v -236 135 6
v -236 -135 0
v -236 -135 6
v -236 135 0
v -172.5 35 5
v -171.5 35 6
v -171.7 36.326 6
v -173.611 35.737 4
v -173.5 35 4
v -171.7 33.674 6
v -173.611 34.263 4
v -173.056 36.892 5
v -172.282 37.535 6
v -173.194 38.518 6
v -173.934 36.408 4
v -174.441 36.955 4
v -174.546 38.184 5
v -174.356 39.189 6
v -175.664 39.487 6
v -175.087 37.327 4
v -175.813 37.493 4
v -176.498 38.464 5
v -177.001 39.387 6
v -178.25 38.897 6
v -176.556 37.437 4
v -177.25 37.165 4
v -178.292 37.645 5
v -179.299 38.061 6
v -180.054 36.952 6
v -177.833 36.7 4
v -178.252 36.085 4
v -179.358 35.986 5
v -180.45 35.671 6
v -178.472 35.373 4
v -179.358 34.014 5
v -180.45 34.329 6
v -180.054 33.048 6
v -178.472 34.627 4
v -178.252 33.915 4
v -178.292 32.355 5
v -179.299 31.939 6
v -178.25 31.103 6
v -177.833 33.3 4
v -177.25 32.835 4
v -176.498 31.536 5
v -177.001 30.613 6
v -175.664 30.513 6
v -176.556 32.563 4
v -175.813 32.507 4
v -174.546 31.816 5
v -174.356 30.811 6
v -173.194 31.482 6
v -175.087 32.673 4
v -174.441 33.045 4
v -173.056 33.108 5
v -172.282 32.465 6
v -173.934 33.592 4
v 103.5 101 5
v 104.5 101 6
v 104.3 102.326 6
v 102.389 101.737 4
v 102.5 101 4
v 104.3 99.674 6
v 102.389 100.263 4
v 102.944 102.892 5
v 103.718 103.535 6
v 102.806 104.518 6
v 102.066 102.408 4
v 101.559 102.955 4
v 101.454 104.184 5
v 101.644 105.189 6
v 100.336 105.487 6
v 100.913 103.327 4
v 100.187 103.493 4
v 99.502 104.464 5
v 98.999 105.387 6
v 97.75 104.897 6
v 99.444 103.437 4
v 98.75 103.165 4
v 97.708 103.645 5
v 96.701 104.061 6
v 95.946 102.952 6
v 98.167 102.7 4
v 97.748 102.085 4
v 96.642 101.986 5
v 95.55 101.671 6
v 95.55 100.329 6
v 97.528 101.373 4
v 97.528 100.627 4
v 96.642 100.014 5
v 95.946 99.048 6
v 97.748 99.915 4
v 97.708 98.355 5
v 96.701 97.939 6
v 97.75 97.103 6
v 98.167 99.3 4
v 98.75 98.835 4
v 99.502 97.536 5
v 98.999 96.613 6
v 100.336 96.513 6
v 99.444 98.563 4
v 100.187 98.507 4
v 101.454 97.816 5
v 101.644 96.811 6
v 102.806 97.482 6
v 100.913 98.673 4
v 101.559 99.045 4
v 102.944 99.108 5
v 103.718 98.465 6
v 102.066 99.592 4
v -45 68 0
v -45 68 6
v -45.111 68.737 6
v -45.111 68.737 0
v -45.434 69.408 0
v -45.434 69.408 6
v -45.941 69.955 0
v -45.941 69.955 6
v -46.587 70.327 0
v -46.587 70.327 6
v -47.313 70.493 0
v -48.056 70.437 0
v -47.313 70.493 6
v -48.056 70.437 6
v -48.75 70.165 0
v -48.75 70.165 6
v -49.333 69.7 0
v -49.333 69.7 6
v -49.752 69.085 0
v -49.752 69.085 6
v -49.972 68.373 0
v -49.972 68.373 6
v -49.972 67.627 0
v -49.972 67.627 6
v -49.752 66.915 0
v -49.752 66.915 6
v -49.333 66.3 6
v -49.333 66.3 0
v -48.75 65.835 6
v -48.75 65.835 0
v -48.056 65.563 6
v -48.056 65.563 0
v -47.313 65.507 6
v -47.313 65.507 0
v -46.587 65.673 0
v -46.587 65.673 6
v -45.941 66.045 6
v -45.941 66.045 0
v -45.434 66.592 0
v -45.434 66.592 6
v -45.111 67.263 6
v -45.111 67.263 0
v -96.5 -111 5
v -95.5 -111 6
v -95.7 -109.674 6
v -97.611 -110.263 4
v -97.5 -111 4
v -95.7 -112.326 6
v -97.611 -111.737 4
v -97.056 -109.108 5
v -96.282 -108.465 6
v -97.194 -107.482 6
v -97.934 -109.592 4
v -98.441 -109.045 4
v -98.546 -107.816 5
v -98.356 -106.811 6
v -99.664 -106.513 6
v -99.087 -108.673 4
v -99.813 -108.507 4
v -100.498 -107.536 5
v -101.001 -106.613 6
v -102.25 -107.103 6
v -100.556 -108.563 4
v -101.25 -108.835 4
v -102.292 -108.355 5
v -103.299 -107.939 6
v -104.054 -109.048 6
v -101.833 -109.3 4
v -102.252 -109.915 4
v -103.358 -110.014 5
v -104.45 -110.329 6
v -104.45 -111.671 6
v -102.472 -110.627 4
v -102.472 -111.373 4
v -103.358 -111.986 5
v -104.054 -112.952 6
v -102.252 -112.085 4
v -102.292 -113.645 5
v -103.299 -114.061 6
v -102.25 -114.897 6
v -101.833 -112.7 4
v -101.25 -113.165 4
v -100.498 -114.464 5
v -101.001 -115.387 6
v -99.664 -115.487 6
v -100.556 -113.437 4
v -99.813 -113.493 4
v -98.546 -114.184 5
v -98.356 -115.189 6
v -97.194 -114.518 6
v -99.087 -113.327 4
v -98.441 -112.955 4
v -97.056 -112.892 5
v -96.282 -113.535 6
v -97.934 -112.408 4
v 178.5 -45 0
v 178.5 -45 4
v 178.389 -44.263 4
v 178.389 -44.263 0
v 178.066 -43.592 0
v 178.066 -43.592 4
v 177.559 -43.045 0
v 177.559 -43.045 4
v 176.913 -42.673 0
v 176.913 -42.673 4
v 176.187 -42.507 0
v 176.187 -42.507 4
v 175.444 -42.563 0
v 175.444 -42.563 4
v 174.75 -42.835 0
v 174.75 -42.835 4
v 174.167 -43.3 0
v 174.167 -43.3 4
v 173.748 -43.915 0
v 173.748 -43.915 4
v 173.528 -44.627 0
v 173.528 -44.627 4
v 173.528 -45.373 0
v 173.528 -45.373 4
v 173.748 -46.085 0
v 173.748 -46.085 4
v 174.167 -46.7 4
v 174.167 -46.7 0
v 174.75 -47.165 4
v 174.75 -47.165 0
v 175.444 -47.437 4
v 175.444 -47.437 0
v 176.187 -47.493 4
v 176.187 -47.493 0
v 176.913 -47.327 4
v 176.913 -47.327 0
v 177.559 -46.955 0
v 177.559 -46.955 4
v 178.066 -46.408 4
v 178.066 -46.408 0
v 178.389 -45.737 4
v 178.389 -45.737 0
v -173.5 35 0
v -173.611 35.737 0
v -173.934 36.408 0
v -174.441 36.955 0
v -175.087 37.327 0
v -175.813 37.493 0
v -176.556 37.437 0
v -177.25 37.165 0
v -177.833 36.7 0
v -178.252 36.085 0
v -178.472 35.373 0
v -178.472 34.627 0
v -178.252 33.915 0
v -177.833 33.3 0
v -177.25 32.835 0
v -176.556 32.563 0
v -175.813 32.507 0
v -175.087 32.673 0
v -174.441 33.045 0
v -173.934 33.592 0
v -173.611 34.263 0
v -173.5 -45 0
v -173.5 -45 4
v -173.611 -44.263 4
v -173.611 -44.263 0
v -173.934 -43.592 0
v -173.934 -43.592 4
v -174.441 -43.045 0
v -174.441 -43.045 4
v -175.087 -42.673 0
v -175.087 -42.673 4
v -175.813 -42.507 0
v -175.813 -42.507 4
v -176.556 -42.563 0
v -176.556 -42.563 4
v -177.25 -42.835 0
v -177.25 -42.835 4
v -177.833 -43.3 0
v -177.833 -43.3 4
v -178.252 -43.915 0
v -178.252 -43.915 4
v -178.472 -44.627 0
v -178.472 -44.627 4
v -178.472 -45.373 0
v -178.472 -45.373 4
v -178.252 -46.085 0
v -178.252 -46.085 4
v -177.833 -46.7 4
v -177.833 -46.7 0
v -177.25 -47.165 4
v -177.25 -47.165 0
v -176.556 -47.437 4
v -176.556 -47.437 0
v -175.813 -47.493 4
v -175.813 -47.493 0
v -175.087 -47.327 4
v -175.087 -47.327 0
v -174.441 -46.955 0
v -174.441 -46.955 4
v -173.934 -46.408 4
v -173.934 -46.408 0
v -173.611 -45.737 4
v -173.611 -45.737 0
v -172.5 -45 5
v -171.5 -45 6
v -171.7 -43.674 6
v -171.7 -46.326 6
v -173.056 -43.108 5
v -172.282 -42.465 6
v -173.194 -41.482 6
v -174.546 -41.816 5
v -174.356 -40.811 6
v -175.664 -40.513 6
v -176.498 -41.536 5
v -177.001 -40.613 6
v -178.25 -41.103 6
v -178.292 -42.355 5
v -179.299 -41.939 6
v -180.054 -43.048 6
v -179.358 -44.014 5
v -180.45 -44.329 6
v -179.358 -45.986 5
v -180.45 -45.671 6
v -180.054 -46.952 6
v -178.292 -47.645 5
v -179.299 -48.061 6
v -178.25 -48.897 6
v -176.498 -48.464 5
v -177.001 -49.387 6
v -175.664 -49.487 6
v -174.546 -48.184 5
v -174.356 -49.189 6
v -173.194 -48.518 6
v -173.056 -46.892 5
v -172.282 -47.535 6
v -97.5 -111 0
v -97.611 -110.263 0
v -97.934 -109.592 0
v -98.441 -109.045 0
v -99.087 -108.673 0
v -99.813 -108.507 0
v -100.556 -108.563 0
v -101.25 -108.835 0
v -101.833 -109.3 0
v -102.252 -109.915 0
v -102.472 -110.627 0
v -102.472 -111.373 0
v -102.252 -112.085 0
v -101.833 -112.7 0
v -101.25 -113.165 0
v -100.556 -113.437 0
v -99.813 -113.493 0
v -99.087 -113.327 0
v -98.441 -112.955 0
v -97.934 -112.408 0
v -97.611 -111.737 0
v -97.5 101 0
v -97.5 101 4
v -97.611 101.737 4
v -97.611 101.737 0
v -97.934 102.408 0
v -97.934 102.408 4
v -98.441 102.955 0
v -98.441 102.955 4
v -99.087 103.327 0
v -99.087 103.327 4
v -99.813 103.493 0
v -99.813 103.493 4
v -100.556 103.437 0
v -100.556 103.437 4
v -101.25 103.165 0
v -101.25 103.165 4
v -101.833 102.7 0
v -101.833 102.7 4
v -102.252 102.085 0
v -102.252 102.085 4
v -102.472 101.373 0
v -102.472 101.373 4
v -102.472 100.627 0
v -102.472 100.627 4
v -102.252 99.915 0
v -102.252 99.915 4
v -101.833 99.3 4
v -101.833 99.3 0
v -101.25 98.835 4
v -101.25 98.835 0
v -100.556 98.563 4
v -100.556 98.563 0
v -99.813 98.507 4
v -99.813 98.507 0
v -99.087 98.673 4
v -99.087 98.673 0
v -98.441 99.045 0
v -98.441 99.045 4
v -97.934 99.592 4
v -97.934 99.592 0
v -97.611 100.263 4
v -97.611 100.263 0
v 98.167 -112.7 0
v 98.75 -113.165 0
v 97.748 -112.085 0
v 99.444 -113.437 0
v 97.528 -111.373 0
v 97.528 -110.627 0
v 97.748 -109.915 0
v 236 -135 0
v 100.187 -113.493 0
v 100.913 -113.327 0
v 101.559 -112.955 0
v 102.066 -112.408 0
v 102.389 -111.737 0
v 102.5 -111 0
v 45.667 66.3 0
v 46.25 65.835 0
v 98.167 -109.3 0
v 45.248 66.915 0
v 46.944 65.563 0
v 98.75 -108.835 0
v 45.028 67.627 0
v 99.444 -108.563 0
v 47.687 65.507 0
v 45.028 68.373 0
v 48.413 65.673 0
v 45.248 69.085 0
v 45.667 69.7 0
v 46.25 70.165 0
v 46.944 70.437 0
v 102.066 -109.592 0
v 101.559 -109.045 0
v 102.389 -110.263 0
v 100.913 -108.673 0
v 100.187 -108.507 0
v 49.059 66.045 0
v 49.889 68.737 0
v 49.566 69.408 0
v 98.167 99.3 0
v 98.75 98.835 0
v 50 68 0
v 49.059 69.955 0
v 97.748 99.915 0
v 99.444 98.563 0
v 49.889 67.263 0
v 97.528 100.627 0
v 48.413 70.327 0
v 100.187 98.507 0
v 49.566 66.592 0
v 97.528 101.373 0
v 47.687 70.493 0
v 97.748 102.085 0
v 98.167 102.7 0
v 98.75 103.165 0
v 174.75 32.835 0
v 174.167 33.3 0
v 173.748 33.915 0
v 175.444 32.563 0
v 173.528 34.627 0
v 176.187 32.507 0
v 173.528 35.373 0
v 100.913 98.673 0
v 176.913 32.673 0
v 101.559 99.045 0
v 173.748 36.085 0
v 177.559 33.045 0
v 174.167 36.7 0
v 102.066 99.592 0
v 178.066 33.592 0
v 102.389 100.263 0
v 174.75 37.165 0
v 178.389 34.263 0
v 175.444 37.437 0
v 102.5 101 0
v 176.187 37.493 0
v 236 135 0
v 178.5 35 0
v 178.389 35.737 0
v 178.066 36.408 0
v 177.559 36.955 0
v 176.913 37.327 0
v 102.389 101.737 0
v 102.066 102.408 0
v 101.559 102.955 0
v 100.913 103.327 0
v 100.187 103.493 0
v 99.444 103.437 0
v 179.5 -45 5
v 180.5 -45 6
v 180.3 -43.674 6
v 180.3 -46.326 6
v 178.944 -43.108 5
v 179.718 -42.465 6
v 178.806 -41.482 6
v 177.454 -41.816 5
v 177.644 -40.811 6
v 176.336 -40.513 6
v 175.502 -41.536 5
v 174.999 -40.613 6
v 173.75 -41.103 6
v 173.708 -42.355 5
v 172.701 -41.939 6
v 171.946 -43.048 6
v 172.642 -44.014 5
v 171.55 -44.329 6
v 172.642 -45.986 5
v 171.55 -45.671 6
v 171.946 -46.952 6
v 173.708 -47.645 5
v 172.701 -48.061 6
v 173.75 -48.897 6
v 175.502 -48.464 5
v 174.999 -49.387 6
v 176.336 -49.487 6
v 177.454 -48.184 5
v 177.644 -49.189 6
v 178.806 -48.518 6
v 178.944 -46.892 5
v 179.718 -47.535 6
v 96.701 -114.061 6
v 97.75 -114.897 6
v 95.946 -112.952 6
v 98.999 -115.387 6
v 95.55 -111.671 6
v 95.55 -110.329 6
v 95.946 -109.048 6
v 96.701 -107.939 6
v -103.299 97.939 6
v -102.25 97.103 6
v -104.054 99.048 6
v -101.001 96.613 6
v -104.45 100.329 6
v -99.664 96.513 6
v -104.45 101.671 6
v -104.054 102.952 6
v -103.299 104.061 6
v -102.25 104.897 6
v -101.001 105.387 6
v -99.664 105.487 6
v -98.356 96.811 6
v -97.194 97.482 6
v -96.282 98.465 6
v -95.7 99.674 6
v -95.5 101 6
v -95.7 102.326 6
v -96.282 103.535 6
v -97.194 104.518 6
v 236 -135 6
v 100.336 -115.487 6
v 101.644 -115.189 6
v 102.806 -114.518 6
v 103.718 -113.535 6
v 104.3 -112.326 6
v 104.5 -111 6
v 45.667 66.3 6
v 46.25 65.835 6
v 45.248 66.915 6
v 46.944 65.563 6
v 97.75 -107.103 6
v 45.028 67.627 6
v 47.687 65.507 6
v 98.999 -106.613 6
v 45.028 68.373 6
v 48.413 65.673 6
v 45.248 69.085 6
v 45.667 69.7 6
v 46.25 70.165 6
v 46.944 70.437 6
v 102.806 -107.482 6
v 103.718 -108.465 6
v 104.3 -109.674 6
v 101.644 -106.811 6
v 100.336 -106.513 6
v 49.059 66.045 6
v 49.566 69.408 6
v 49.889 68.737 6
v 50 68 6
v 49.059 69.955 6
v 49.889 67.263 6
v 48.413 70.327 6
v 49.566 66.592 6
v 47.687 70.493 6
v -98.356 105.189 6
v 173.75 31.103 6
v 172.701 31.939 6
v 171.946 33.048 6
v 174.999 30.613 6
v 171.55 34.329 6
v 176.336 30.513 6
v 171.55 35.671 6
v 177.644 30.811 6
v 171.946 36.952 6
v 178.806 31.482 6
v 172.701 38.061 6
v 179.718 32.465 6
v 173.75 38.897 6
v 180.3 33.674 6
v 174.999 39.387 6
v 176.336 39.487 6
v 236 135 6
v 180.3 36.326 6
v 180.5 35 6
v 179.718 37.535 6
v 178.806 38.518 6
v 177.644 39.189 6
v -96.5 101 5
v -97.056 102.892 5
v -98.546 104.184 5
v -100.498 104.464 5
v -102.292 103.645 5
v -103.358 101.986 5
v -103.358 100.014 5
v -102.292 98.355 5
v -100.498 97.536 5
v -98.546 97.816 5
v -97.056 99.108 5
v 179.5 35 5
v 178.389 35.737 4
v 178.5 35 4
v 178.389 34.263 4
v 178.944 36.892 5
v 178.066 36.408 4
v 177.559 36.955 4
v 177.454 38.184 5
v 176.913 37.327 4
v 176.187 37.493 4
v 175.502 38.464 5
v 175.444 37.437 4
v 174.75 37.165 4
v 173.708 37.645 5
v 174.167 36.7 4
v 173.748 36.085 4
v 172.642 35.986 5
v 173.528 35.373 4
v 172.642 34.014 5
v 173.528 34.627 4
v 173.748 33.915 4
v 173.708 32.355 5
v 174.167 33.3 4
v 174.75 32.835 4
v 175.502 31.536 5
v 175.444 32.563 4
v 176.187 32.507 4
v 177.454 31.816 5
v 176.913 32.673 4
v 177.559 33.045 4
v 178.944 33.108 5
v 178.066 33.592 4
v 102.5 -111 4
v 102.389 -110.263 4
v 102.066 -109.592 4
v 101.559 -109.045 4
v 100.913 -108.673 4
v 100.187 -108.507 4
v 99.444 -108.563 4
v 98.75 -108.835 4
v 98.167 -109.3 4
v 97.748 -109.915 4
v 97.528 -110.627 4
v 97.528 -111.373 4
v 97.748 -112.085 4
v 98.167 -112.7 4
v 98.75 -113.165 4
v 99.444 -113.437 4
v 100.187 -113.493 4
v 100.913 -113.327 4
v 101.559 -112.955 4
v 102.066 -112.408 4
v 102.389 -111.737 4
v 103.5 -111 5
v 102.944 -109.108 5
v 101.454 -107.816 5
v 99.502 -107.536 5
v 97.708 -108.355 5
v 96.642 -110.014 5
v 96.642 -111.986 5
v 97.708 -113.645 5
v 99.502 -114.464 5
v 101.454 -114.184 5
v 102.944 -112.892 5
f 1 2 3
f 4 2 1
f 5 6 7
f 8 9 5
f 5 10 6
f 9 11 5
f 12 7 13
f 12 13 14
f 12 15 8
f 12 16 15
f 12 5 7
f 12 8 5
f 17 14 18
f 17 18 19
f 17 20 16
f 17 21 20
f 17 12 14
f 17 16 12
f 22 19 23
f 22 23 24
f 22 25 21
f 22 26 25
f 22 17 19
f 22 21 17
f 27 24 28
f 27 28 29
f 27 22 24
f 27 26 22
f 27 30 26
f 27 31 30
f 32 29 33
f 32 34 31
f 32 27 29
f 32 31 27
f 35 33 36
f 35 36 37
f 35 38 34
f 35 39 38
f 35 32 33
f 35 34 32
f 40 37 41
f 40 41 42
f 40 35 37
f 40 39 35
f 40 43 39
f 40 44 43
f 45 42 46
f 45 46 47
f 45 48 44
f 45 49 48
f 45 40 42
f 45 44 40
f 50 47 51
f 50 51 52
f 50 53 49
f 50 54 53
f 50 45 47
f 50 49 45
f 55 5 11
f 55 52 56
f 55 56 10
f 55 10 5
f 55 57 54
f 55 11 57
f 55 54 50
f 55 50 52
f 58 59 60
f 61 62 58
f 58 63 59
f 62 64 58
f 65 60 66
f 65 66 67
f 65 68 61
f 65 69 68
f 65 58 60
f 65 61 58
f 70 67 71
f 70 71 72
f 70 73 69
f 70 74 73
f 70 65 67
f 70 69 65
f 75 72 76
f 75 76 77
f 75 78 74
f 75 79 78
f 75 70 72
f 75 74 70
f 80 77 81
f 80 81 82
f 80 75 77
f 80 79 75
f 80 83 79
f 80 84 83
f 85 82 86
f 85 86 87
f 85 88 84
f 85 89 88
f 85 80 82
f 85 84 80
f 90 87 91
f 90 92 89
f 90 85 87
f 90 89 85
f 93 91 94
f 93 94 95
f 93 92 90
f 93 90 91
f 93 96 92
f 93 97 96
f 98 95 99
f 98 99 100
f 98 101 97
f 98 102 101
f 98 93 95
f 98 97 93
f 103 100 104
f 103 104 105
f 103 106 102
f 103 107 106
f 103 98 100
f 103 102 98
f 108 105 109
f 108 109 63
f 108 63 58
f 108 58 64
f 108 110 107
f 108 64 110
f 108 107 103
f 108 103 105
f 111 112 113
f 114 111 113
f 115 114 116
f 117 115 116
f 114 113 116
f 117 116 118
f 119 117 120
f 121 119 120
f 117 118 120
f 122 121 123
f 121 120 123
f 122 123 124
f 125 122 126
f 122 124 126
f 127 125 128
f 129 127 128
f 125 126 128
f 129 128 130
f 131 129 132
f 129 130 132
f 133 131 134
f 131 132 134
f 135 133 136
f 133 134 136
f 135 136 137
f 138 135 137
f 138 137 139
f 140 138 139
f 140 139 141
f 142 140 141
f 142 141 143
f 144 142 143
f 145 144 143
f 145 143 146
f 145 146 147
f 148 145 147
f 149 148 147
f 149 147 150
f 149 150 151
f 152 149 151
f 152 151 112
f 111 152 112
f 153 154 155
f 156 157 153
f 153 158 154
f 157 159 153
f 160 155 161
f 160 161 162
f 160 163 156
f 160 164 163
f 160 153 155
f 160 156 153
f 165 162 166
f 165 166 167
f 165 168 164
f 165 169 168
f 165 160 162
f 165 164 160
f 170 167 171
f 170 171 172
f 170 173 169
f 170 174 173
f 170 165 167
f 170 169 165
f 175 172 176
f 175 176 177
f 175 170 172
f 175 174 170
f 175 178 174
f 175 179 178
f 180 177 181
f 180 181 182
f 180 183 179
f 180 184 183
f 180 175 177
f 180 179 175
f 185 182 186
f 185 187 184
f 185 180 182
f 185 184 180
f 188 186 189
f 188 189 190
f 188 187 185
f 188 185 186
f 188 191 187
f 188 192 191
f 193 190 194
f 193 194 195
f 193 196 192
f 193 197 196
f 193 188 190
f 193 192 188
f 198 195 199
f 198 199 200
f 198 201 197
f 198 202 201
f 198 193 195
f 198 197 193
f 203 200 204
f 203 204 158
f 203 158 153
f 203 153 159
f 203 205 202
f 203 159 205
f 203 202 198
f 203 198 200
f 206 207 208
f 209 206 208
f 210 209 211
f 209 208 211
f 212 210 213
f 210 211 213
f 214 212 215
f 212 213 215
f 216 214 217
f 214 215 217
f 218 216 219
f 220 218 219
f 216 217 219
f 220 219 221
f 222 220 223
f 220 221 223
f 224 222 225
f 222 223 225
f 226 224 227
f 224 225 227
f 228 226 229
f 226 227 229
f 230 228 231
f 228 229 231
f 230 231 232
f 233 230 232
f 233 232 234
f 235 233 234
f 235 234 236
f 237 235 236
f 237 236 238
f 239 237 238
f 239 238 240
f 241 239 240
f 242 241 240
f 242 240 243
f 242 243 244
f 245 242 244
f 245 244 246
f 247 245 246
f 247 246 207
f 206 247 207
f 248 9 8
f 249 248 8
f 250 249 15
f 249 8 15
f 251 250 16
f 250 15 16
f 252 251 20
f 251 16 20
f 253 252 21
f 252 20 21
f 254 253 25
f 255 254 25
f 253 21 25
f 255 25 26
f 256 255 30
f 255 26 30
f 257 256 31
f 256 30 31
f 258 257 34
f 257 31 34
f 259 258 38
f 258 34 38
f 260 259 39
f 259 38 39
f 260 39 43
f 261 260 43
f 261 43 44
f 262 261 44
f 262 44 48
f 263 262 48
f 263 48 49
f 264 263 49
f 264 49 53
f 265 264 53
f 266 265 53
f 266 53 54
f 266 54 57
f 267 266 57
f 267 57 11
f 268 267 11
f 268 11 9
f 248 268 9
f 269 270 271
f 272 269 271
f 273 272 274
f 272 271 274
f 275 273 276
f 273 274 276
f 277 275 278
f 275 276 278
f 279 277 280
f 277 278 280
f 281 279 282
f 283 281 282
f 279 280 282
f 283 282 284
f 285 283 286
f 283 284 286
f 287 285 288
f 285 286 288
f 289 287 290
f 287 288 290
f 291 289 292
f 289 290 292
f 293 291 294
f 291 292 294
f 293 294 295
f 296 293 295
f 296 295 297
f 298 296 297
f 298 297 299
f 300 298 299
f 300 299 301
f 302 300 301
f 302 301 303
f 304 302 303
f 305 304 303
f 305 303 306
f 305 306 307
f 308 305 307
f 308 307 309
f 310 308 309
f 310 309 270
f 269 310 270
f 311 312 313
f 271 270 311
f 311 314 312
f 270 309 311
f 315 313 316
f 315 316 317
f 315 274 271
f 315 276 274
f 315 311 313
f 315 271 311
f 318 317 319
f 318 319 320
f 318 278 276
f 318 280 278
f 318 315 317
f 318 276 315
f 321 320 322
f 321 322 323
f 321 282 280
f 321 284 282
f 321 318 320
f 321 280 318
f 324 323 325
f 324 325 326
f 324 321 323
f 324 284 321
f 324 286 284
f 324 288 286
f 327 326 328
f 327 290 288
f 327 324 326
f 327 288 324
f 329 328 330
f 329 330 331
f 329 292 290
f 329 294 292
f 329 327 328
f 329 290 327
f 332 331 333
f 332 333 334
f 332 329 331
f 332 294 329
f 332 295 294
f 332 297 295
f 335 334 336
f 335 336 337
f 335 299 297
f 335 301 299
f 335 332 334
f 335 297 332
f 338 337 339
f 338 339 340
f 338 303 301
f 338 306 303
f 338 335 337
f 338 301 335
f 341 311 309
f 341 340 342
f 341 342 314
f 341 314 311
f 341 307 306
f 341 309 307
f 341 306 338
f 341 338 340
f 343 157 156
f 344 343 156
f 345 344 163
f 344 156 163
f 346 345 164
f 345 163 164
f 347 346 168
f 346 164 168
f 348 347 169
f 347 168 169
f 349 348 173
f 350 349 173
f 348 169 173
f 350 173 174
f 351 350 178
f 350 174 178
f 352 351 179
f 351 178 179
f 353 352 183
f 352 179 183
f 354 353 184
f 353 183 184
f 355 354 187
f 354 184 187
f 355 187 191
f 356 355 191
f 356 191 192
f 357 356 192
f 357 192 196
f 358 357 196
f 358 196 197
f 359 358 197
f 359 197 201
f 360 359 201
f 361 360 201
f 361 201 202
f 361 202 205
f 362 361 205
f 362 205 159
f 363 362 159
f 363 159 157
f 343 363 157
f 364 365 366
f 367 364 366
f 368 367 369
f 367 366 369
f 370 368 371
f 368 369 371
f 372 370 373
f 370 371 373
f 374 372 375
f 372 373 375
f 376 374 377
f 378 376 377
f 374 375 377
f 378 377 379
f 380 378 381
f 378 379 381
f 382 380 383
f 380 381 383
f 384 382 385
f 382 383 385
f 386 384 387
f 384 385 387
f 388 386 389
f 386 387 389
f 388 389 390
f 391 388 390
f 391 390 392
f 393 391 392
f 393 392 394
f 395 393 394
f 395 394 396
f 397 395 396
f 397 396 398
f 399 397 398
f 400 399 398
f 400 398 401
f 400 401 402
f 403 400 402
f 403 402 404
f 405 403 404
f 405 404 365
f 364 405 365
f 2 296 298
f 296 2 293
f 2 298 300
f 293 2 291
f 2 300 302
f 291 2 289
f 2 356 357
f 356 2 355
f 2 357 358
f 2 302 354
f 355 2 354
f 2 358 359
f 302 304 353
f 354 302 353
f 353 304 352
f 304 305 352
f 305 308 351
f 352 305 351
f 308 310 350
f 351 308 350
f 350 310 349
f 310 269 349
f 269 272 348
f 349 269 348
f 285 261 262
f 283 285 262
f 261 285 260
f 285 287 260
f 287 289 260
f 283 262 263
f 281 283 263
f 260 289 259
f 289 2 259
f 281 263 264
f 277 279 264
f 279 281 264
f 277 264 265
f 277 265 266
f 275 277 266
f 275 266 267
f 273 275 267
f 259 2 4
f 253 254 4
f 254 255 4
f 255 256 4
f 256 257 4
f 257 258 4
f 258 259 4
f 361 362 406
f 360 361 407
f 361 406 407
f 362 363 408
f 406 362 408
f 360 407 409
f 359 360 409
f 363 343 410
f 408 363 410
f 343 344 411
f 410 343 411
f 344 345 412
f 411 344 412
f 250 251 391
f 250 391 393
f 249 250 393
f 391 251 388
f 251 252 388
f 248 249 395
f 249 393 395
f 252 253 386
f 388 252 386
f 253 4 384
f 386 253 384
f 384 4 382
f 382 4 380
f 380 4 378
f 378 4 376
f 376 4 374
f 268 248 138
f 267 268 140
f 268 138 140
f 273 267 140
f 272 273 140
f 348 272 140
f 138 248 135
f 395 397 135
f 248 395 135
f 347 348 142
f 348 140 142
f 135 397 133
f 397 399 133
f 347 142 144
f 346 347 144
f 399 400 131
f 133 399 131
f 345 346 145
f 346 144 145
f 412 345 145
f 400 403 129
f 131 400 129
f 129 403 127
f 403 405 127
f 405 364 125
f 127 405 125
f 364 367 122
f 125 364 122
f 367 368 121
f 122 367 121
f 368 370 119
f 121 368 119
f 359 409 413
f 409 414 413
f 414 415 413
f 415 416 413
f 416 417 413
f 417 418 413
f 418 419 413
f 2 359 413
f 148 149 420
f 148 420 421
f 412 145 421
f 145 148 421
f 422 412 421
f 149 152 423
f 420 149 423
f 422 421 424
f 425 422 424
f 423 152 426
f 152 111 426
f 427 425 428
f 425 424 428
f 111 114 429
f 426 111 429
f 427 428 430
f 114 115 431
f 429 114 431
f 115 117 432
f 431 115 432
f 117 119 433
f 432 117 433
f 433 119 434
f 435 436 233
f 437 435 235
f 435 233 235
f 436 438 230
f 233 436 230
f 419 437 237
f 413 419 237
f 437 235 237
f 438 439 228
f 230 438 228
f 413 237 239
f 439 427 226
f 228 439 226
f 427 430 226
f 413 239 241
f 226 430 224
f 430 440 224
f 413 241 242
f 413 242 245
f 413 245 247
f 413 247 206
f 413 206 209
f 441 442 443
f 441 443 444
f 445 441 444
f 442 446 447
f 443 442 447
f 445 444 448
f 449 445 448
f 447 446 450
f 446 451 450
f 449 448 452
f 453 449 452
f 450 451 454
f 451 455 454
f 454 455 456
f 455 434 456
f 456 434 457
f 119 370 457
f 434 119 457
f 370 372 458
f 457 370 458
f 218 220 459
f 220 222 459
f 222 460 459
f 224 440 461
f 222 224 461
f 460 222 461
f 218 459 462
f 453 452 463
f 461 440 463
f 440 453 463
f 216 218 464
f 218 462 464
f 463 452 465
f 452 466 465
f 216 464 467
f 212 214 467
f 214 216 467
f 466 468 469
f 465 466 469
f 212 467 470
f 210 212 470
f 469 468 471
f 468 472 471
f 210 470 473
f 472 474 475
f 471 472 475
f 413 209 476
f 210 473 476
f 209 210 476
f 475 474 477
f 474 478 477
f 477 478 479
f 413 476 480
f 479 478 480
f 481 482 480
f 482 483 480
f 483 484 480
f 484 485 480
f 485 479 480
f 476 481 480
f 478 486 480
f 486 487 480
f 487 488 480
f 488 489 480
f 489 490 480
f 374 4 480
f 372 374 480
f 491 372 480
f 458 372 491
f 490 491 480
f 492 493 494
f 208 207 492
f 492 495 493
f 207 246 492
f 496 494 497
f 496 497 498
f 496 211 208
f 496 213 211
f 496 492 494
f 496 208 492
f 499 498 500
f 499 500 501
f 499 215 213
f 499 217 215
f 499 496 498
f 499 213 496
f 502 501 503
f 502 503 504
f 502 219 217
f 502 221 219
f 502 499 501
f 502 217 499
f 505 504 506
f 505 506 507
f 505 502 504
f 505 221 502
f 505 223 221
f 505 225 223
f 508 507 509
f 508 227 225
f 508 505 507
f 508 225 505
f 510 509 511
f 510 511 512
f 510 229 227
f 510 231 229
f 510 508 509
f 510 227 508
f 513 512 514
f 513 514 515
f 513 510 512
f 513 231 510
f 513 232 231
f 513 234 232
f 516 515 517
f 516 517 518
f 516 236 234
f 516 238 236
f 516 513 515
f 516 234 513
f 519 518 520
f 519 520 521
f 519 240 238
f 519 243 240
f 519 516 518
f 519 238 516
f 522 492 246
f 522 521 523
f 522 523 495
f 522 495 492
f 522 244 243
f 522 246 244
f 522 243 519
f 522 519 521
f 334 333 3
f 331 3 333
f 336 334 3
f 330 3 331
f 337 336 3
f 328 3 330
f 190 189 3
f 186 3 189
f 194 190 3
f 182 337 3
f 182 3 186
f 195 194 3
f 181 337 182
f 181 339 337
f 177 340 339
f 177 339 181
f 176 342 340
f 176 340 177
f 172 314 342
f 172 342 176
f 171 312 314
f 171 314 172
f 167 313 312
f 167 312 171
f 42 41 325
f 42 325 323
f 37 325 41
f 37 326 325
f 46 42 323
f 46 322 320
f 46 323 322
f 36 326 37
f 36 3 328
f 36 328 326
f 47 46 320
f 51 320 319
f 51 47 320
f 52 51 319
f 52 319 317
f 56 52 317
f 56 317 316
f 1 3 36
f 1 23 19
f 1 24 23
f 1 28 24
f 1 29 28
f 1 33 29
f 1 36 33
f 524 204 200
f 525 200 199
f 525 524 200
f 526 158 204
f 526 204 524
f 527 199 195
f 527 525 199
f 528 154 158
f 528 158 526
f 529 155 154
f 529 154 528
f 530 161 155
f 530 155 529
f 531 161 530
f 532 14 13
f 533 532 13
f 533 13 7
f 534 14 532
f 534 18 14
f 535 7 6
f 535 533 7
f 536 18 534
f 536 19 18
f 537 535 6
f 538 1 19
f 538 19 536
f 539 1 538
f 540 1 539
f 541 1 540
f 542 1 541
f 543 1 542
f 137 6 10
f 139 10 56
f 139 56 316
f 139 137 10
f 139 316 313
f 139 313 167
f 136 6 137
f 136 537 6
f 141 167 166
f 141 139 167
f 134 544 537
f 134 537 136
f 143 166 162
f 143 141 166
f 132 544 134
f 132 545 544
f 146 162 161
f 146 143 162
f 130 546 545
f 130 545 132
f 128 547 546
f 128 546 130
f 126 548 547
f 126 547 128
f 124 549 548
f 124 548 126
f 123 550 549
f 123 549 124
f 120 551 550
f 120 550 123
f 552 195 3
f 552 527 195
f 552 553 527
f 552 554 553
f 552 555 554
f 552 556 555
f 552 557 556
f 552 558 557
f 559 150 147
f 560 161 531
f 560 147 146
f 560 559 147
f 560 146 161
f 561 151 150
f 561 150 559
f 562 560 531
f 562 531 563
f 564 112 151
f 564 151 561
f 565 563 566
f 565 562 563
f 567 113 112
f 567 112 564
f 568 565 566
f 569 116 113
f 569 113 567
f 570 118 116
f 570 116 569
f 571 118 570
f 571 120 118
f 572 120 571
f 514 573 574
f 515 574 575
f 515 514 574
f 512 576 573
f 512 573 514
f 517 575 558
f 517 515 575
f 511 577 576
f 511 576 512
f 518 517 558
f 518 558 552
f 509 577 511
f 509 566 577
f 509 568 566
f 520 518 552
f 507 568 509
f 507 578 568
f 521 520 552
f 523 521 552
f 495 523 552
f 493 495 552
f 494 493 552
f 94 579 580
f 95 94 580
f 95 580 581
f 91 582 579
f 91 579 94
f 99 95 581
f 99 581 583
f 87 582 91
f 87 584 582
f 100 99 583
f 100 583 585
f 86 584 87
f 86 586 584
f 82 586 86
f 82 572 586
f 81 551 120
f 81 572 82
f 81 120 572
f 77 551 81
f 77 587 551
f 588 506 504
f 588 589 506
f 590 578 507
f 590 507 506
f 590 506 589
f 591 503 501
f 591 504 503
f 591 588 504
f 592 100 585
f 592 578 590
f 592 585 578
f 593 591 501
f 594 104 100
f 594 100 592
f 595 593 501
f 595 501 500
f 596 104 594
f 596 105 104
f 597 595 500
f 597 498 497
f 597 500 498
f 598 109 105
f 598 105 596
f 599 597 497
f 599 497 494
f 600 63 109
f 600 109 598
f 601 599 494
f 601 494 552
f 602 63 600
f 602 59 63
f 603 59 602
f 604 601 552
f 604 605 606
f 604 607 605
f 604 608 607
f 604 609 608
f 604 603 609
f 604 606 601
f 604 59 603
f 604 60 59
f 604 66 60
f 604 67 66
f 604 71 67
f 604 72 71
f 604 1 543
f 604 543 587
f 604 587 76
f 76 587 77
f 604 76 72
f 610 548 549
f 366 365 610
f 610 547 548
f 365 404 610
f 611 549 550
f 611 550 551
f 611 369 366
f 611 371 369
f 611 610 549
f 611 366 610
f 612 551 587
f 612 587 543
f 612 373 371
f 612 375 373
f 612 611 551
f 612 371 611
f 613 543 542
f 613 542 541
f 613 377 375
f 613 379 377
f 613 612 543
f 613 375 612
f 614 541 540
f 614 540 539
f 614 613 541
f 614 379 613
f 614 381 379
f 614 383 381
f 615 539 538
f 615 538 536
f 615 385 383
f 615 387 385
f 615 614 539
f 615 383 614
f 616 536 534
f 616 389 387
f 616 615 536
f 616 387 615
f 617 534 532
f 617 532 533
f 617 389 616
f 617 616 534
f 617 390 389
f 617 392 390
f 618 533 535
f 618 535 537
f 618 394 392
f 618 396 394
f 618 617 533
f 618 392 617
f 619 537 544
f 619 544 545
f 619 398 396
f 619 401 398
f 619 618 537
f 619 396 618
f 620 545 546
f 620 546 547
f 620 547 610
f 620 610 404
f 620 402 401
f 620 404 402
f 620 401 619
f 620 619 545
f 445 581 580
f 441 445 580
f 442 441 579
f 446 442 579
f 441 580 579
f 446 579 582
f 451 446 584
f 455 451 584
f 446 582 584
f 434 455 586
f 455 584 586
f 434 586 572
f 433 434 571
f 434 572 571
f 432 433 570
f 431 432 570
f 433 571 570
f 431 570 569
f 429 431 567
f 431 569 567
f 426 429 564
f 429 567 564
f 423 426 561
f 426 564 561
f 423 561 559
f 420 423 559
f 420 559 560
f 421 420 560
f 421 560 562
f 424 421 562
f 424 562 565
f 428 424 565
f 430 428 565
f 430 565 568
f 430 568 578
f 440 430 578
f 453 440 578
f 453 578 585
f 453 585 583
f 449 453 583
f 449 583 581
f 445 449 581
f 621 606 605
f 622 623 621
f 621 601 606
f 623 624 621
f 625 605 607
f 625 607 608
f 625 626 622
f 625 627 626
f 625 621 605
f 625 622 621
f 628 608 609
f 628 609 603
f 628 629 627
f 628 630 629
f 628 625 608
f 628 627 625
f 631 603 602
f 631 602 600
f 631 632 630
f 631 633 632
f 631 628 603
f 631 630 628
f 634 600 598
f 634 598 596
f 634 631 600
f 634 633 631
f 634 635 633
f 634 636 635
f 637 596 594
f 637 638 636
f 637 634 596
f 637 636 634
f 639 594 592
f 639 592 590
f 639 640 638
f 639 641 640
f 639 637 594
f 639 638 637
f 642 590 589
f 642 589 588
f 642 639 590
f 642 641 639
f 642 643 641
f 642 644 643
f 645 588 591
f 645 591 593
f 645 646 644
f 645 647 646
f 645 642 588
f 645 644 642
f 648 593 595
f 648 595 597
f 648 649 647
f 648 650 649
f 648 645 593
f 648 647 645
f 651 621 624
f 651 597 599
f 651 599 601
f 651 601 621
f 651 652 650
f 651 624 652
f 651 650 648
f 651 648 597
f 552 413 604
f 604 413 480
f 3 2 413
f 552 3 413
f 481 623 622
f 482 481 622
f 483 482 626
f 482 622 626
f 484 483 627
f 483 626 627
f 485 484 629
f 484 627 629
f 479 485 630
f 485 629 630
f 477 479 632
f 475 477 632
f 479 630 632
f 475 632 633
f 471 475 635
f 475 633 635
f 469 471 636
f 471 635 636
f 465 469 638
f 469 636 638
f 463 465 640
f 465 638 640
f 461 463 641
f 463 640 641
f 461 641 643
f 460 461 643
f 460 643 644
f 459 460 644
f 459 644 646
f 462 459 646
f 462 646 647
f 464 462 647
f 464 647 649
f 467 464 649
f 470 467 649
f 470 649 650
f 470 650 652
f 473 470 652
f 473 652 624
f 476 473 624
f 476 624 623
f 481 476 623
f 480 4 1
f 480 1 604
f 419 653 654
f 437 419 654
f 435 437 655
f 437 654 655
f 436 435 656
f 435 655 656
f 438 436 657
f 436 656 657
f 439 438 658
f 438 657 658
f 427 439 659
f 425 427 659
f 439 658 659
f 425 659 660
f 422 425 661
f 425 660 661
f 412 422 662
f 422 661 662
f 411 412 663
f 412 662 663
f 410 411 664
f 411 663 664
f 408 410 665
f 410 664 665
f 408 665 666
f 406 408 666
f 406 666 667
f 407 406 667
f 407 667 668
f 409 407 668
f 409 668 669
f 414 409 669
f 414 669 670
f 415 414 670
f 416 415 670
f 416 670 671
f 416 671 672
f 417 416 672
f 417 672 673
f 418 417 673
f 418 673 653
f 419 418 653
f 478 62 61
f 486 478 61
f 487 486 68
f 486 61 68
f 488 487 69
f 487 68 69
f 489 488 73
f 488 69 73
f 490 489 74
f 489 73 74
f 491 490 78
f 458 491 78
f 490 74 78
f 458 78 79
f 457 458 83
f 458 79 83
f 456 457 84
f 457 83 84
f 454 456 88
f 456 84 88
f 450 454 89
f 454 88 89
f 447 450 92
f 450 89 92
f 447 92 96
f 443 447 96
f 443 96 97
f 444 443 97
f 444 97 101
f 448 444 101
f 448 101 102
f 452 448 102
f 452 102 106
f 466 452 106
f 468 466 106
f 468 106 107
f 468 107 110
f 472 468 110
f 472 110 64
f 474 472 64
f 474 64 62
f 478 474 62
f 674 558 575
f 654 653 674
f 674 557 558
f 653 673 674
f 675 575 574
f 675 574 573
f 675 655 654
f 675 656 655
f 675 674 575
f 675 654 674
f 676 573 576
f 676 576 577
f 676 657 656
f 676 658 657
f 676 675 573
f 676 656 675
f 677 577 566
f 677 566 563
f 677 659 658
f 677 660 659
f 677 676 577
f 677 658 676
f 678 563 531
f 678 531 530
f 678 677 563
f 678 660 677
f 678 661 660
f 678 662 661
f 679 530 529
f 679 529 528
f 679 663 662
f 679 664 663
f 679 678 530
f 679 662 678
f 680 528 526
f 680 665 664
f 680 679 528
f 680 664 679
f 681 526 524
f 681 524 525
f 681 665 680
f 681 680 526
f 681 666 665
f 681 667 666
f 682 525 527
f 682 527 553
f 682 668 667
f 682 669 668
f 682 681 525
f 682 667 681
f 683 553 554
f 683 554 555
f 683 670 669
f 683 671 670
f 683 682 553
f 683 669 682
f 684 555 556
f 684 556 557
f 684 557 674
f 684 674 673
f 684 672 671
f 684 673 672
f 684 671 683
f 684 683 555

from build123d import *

# Parameters (mm, degrees)
ESQUISSE1_W             = 472
ESQUISSE1_H             = 270
BOSS_EXTRU_1_DEPTH      = 6
ESQUISSE2_R             = 2.5
ENL_V_MAT_EXTRU_1_DEPTH = 272.950363118
CHANFREIN1_SIZE         = 2
ESQUISSE3_R             = 2.5
ENL_V_MAT_EXTRU_2_DEPTH = 272.950363118


with BuildPart() as part:
    # Esquisse1 → Boss.-Extru.1 (new body)
    with BuildSketch(Plane.XY):
        Rectangle(ESQUISSE1_W, ESQUISSE1_H)
    extrude(amount=BOSS_EXTRU_1_DEPTH)

    # Esquisse2 → Enlèv. mat.-Extru.1 (cut, through all)
    with BuildSketch(Plane.XY.offset(6)):
        with Locations((-100, 101)):
            Circle(ESQUISSE2_R)
        with Locations((100, 101)):
            Circle(ESQUISSE2_R)
        with Locations((176, 35)):
            Circle(ESQUISSE2_R)
        with Locations((176, -45)):
            Circle(ESQUISSE2_R)
        with Locations((100, -111)):
            Circle(ESQUISSE2_R)
        with Locations((-100, -111)):
            Circle(ESQUISSE2_R)
        with Locations((-176, -45)):
            Circle(ESQUISSE2_R)
        with Locations((-176, 35)):
            Circle(ESQUISSE2_R)
    extrude(amount=-ENL_V_MAT_EXTRU_1_DEPTH, mode=Mode.SUBTRACT)

    # Chanfrein1
    chanfrein1_edges = [part.edges().sort_by_distance(p)[0] for p in [
        (-178.5, 35, 6),
        (-178.5, -45, 6),
        (-102.5, -111, 6),
        (97.5, -111, 6),
        (173.5, -45, 6),
        (173.5, 35, 6),
        (97.5, 101, 6),
        (-102.5, 101, 6),
    ]]
    chamfer(chanfrein1_edges, length=CHANFREIN1_SIZE)

    # Esquisse3 → Enlèv. mat.-Extru.2 (cut, through all)
    with BuildSketch(Plane.XY.offset(6)):
        with Locations((-47.5, 68)):
            Circle(ESQUISSE3_R)
        with Locations((47.5, 68)):
            Circle(ESQUISSE3_R)
    extrude(amount=-ENL_V_MAT_EXTRU_2_DEPTH, mode=Mode.SUBTRACT)


solid = part.part
